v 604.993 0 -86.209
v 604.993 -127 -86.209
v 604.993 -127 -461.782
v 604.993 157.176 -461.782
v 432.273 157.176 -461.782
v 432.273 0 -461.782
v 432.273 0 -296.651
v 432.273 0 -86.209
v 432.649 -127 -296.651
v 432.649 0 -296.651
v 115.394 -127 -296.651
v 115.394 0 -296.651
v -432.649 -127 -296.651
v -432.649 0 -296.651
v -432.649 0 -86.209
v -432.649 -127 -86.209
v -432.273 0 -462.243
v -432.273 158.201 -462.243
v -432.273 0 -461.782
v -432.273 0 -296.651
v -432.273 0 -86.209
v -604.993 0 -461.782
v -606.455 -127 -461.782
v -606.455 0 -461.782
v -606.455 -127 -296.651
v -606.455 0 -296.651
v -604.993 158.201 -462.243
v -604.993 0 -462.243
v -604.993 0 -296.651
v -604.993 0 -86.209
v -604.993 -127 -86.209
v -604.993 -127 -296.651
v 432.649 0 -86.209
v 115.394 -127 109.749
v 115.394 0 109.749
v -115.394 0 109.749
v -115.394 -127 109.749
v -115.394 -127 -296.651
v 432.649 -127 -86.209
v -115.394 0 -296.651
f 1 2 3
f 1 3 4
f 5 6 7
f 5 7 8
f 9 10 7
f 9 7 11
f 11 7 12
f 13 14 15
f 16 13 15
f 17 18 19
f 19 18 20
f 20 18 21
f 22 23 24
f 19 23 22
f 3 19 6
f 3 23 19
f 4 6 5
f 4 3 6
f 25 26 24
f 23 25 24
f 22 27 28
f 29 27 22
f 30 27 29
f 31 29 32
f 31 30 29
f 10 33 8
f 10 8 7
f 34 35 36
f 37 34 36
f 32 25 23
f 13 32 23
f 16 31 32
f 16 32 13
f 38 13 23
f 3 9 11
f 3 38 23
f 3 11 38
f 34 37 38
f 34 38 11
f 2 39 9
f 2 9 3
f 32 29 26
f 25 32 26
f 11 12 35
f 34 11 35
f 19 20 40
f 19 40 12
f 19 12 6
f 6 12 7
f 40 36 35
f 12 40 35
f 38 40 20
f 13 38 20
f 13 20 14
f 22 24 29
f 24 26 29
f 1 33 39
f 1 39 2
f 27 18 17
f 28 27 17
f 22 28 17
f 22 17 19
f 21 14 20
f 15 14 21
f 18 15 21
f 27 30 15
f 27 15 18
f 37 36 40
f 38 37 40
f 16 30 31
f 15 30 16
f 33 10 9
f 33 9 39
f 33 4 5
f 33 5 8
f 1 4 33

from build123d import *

# Parameters (mm, degrees)
F0_W     = 172.344496
F0_H     = 210.44275
F1_DEPTH = 127
F4_DEPTH = 172.72
F5_DEPTH = 172.72


with BuildPart() as f1:
    # F0 (on Front) → F1 (new body)
    with BuildSketch(Plane.XZ):
        Polygon((0, 109.74871), (0, 0), (0, -296.65129), (115.393949, -296.65129), (115.393949, 109.74871), align=None)
        Polygon((0, -296.65129), (0, 0), (0, 109.74871), (-115.393949, 109.74871), (-115.393949, -296.65129), align=None)
        Polygon((115.393949, -296.65129), (0, -296.65129), (0, -461.782325), (604.993302, -461.782325), (604.993302, -296.65129), (432.648806, -296.65129), align=None)
        Polygon((0, -461.782325), (0, -296.65129), (-115.393949, -296.65129), (-432.648806, -296.65129), (-604.993302, -296.65129), (-606.454597, -296.65129), (-606.454597, -461.782325), align=None)
        with Locations((-518.821054, -191.429915)):
            Rectangle(F0_W, F0_H)
        with Locations((518.821054, -191.429915)):
            Rectangle(F0_W, F0_H)
    extrude(amount=F1_DEPTH)

    # F3 (on face) → F4 (join)
    with BuildSketch(Plane(origin=(-604.993302, 0, 0), x_dir=(0, -1, 0), z_dir=(-1, 0, 0))):
        Polygon((0, -462.243229), (0, -86.20854), (-158.201262, -462.243229), align=None)
    extrude(amount=-F4_DEPTH)

    # F2 (on face) → F5 (join)
    with BuildSketch(Plane.YZ.offset(604.993302)):
        Polygon((157.176092, -461.782325), (0, -86.20854), (0, -461.782325), align=None)
    extrude(amount=-F5_DEPTH)


solid = f1.part
